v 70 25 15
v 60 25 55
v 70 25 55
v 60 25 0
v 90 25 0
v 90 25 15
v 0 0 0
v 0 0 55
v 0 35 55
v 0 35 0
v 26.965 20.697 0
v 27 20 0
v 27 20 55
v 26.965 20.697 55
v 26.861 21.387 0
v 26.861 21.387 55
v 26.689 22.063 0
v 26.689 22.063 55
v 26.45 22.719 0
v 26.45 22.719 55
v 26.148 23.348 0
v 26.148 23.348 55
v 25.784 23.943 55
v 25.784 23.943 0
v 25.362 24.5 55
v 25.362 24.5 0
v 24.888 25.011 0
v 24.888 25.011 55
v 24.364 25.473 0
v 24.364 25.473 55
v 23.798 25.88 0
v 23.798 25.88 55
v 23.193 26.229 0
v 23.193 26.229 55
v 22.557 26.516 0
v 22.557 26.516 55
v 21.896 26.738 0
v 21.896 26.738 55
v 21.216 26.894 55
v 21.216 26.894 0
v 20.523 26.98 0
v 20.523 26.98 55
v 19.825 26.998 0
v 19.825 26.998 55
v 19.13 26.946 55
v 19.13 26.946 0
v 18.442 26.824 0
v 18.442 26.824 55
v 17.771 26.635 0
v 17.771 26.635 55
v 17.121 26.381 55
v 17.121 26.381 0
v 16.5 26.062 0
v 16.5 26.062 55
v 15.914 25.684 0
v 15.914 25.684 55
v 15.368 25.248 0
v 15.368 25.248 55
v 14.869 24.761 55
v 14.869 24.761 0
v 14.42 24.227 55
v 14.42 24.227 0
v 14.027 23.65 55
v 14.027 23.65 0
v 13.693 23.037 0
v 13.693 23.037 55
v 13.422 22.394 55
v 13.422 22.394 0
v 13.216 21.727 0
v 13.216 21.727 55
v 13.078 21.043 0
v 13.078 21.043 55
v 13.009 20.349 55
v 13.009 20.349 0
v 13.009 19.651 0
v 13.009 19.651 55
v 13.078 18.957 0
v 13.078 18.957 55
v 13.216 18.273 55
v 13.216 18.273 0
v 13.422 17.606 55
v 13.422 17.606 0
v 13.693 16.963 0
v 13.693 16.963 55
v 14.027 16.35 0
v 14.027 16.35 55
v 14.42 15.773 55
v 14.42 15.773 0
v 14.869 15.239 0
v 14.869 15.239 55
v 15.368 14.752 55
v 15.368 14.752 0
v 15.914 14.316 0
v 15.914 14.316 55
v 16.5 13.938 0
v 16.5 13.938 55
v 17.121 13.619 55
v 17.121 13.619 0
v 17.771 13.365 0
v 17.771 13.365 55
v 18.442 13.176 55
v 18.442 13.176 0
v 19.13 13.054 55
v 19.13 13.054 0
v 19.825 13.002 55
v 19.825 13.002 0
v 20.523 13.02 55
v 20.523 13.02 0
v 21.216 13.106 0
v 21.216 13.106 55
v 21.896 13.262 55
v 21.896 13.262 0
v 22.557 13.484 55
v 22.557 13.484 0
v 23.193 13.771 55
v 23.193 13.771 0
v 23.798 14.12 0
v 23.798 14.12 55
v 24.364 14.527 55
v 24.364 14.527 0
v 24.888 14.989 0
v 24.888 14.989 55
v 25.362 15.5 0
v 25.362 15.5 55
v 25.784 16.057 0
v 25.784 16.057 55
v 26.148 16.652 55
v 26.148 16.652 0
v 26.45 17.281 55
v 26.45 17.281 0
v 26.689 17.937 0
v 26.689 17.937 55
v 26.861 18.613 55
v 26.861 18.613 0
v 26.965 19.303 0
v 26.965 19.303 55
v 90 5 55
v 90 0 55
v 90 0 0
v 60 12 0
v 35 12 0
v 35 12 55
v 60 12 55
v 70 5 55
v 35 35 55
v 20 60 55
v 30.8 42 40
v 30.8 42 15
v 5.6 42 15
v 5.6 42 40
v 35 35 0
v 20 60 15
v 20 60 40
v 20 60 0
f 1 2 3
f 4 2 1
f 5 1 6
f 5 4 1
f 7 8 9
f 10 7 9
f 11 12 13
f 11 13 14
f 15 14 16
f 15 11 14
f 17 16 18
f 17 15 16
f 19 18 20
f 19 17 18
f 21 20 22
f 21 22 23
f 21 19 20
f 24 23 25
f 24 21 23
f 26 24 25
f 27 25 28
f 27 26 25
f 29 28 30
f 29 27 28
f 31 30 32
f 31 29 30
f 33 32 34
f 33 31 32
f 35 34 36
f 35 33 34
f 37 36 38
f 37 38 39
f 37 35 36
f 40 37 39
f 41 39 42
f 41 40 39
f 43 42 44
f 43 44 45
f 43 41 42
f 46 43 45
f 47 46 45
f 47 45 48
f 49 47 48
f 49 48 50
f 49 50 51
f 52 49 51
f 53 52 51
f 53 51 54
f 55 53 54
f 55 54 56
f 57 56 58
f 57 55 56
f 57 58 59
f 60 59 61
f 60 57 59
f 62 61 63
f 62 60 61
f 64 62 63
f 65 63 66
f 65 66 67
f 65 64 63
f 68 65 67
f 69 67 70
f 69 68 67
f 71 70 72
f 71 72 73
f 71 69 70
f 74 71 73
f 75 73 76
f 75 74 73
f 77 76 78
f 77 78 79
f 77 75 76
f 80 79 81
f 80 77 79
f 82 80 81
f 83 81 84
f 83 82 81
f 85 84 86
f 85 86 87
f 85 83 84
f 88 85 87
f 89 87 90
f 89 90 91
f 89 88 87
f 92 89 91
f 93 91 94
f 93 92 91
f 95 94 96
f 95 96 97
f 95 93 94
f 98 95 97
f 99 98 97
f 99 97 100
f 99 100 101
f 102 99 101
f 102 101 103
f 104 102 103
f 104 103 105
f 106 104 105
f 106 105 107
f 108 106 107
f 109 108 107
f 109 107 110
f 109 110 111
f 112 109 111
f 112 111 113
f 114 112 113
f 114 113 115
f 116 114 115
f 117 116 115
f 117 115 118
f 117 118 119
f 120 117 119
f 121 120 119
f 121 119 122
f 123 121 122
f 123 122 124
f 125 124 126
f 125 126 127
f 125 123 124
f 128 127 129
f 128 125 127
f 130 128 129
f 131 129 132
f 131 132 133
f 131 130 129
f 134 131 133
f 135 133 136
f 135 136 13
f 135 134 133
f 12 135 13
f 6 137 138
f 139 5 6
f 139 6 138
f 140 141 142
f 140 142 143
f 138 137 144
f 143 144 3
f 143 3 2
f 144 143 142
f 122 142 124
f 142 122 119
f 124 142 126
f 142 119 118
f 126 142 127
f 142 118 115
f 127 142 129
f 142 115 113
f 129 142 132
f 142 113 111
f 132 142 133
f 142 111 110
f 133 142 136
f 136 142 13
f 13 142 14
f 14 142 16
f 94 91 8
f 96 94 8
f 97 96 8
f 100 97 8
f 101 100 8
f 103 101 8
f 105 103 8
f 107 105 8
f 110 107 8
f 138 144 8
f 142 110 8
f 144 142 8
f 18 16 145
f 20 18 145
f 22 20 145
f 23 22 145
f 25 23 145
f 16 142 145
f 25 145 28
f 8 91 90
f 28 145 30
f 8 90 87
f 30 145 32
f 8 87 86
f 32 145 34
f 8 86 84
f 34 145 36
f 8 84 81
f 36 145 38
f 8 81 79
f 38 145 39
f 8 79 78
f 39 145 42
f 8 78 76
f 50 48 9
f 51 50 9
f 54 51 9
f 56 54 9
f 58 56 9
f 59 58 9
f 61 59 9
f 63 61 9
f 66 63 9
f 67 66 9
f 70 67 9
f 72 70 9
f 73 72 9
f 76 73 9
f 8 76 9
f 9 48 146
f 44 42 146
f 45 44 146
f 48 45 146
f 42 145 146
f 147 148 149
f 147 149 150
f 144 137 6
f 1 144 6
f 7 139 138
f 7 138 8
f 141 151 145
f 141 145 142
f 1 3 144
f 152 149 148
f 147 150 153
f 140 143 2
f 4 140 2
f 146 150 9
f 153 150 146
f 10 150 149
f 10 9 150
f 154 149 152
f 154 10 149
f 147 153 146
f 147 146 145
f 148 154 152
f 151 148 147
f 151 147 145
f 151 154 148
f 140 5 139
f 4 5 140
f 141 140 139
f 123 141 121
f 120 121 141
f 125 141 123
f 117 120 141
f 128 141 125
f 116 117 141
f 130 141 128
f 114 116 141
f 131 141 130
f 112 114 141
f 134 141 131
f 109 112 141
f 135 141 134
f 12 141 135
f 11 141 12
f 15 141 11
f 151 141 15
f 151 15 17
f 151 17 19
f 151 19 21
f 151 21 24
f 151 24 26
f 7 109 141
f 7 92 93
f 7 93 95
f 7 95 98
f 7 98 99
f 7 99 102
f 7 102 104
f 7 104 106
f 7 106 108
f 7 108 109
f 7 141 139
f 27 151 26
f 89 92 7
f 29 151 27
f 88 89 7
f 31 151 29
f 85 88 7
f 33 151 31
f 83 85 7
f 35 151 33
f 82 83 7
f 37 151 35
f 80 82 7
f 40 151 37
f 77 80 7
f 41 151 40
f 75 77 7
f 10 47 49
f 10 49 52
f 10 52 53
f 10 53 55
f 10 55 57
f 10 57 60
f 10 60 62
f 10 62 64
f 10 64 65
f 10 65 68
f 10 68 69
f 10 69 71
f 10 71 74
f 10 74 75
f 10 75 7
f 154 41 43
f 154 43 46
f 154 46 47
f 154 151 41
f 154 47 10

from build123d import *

# Parameters (mm, degrees)
SKETCH2_R               = 7
BOSS_EXTRUDE1_DEPTH     = 55
CUT_EXTRUDE1_DEPTH      = 1
CUT_EXTRUDE1_DEPTH_BACK = 20
SKETCH5_W               = 25
SKETCH5_H               = 18
CUT_EXTRUDE2_DEPTH      = 91


with BuildPart() as part:
    # Sketch2 → Boss-Extrude1 (new body)
    with BuildSketch(Plane.XY):
        Polygon((0, 0), (0, 35), (20, 60), (35, 35), (35, 12), (60, 12), (60, 25), (90, 25), (90, 0), align=None)
        with Locations((20, 20)):
            Circle(SKETCH2_R, mode=Mode.SUBTRACT)
    extrude(amount=BOSS_EXTRUDE1_DEPTH)

    # Sketch3 → Cut-Extrude1 (cut, two sides)
    with BuildSketch(Plane(origin=(90, 0, 0), x_dir=(0, 0, -1), z_dir=(1, 0, 0))) as cut_extrude1_sk:
        Polygon((-203.084488957, -69.042244479), (-55, 5), (-15, 25), (133.084488957, 99.042244479), (-15, 395.211222394), (-351.168977915, 227.126733436), align=None)
    extrude(amount=CUT_EXTRUDE1_DEPTH, mode=Mode.SUBTRACT)
    extrude(cut_extrude1_sk.sketch, amount=-CUT_EXTRUDE1_DEPTH_BACK, mode=Mode.SUBTRACT)

    # Sketch5 → Cut-Extrude2 (cut, through all)
    with BuildSketch(Plane.ZY):
        with Locations((27.5, 51)):
            Rectangle(SKETCH5_W, SKETCH5_H)
    extrude(amount=-CUT_EXTRUDE2_DEPTH, mode=Mode.SUBTRACT)


solid = part.part
